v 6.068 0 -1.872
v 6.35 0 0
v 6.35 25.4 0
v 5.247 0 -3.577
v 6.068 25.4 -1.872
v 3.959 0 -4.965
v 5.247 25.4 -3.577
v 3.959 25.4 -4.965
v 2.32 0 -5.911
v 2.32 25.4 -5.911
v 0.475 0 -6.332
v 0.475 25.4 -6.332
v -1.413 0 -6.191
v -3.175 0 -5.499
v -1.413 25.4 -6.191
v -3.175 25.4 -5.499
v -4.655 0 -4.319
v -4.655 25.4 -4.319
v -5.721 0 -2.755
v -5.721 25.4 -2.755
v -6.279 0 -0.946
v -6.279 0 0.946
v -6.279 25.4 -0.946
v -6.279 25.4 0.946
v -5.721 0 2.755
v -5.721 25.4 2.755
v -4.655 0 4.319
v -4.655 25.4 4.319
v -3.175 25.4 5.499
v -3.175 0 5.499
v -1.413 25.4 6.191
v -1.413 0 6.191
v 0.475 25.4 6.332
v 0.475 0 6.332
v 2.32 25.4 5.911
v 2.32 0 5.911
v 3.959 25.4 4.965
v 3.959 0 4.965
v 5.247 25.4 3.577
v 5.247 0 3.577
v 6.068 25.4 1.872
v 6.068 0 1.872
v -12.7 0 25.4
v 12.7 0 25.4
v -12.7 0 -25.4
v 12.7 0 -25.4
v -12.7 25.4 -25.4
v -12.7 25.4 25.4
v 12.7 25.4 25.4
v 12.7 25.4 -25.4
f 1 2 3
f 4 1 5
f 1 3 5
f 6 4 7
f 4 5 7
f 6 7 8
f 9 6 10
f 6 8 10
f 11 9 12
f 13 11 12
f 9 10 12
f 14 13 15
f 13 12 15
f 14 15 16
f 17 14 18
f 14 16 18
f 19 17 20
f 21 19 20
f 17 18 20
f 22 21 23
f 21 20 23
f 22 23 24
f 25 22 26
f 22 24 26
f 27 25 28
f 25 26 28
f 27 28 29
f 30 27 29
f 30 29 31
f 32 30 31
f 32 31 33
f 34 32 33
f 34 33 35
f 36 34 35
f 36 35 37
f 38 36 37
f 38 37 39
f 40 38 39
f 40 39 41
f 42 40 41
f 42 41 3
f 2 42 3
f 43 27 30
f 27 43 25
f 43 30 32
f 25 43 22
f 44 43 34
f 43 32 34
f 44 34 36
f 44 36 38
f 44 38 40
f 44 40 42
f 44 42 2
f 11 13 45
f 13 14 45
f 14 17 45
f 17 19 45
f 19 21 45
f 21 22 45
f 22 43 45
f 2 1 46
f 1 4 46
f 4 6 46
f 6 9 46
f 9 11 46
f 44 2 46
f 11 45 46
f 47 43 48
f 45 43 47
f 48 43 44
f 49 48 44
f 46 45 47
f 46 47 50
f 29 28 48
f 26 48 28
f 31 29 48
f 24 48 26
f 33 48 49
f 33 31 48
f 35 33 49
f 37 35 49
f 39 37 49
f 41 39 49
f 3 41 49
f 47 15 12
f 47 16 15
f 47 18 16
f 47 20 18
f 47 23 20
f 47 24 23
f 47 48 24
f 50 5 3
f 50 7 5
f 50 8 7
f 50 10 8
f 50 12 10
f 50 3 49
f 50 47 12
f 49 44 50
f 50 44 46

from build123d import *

# Parameters (mm, degrees)
SKETCH1_W           = 25.4
SKETCH1_H           = 50.8
BOSS_EXTRUDE1_DEPTH = 25.4
CUT_EXTRUDE1_REACH  = 27.4
SKETCH2_R           = 6.35


with BuildPart() as part:
    # Sketch1 → Boss-Extrude1 (new body)
    with BuildSketch(Plane(origin=(0, 0, 0), x_dir=(1, 0, 0), z_dir=(0, 1, 0))):
        Rectangle(SKETCH1_W, SKETCH1_H)
    extrude(amount=BOSS_EXTRUDE1_DEPTH)

    # Sketch2 → Cut-Extrude1 (cut, up to next)
    with BuildSketch(Plane(origin=(0, 25.4, 0), x_dir=(1, 0, 0), z_dir=(0, 1, 0)), mode=Mode.PRIVATE) as cut_extrude1_sk1:
        Circle(SKETCH2_R)
    cut_extrude1_tool1 = extrude(cut_extrude1_sk1.sketch, amount=-CUT_EXTRUDE1_REACH, mode=Mode.PRIVATE) & part.part
    add(cut_extrude1_tool1.solids().sort_by_distance((0, 25.4, 0))[0], mode=Mode.SUBTRACT)


solid = part.part
